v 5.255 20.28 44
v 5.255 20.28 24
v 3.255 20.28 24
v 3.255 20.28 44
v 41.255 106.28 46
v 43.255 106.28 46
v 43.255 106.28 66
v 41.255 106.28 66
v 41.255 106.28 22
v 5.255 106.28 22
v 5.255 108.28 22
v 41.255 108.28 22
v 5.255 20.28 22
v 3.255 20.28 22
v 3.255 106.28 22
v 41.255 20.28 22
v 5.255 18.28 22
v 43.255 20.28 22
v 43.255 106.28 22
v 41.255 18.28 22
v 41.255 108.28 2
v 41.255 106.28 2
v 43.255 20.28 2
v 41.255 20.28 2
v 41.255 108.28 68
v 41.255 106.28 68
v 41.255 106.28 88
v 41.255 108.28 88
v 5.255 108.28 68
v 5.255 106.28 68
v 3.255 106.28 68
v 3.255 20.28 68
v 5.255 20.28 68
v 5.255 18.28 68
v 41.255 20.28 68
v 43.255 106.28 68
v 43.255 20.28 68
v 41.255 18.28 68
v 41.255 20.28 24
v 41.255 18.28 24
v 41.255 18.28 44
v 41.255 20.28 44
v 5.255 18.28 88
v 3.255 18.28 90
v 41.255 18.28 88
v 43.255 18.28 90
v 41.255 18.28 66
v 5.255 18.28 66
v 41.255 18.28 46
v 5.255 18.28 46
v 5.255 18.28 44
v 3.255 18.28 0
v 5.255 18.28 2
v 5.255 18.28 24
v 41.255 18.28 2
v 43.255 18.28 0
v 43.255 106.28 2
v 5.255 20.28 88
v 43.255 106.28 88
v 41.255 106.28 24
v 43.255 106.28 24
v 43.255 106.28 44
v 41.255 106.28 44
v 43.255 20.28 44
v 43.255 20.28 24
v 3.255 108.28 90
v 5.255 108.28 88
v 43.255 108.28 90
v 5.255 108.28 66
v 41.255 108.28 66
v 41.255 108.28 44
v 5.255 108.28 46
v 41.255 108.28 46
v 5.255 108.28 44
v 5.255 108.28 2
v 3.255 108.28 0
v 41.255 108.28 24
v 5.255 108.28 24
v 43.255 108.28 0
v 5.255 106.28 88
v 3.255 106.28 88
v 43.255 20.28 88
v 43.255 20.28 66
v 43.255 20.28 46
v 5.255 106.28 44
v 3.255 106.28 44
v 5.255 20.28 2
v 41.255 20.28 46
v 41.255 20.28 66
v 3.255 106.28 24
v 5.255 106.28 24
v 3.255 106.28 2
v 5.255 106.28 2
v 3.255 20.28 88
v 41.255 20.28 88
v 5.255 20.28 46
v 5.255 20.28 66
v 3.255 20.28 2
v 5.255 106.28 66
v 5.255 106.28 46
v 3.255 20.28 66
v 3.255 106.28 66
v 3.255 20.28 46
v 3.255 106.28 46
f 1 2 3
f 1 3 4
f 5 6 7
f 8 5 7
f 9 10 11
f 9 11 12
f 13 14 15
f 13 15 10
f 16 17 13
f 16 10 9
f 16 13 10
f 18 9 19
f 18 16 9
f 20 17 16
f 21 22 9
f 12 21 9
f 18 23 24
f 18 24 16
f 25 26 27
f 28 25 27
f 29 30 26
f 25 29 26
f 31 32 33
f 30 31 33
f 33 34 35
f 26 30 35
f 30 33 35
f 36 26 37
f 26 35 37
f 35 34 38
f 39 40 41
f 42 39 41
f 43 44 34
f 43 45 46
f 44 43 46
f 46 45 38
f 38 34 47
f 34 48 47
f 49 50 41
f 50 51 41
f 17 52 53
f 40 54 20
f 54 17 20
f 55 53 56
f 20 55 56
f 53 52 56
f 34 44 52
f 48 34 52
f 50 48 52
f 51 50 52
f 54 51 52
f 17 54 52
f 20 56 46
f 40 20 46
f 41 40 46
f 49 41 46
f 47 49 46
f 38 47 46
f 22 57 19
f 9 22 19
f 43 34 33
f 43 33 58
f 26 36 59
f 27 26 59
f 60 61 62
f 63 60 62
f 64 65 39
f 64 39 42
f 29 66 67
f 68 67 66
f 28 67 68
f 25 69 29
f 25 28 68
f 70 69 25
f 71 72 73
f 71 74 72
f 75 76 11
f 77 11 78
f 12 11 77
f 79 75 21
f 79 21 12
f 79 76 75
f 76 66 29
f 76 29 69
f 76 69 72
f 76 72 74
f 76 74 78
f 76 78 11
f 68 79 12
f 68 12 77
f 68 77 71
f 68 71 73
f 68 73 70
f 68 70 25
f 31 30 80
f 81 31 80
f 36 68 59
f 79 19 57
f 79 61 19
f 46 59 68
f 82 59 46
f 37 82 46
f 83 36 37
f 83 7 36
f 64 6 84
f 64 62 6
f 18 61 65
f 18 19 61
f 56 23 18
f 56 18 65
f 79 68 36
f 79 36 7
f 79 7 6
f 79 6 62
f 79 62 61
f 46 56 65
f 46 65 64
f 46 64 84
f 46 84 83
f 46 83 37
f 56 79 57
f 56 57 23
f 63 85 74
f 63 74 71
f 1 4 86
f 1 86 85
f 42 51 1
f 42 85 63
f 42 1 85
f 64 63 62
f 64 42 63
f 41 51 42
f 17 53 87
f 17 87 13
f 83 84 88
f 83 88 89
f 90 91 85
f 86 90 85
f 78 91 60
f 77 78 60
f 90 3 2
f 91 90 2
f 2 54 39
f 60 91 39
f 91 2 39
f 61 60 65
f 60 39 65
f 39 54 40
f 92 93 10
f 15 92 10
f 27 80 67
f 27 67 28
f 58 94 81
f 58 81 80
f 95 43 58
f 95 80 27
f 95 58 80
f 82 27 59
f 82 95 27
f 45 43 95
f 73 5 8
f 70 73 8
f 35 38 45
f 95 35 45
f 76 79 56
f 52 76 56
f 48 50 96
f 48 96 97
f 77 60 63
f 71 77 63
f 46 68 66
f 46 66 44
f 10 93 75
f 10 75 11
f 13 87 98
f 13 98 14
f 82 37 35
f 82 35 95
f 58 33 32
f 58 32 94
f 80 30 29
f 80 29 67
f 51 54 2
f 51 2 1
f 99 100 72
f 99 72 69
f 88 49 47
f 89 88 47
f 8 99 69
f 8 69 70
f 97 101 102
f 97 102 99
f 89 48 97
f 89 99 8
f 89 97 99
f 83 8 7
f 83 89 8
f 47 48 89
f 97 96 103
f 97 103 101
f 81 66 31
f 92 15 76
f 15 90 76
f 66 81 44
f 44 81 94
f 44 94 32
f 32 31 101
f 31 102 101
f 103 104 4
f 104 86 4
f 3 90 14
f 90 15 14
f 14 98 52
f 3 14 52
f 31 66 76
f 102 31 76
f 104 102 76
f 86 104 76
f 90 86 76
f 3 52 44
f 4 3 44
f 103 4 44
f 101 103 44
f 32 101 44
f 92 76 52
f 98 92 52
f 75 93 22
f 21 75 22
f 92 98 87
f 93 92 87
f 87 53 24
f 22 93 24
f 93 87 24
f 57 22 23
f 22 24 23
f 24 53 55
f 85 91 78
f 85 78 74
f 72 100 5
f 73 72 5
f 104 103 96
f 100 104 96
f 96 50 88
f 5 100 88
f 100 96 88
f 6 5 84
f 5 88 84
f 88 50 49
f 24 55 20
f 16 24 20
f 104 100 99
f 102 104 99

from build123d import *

# Parameters (mm, degrees)
F0_W     = 90
F0_H     = 40
F1_DEPTH = 90
F2_ANGLE = 90
F3_W     = 86
F3_H     = 20
F4_DEPTH = 40.001
F5_W     = 36
F5_H     = 20
F6_DEPTH = 90.001


# Not quite as in the source:
# - a feature names something its author has since deleted; it is built from what else it names


with BuildPart() as f1:
    # F0 (on Top) → F1 (new body)
    with BuildSketch(Plane.XY):
        with Locations((-1.7447127029, -1.7198646705)):
            Rectangle(F0_W, F0_H)
    extrude(amount=F1_DEPTH)


with BuildPart() as f1_1:
    # F2: moved
    add(f1.part.rotate(Axis((43.2552872971, 18.2801353295, 45), (0, 0, -1)), F2_ANGLE))

    # F3 (on face) → F4 (cut, through all)
    with BuildSketch(Plane.YZ.offset(43.2552872971)):
        with Locations((63.2801353295, 78)):
            Rectangle(F3_W, F3_H)
        with Locations((63.2801353295, 56)):
            Rectangle(F3_W, F3_H)
        with Locations((63.2801353295, 34)):
            Rectangle(F3_W, F3_H)
        with Locations((63.2801353295, 12)):
            Rectangle(F3_W, F3_H)
    extrude(amount=-F4_DEPTH, mode=Mode.SUBTRACT)

    # F5 (on face) → F6 (cut, through all)
    with BuildSketch(Plane.XZ.offset(-18.2801353295)):
        with Locations((23.2552872971, 78)):
            Rectangle(F5_W, F5_H)
        with Locations((23.2552872971, 56)):
            Rectangle(F5_W, F5_H)
        with Locations((23.2552872971, 34)):
            Rectangle(F5_W, F5_H)
        with Locations((23.2552872971, 12)):
            Rectangle(F5_W, F5_H)
    extrude(amount=-F6_DEPTH, mode=Mode.SUBTRACT)


solid = f1_1.part
